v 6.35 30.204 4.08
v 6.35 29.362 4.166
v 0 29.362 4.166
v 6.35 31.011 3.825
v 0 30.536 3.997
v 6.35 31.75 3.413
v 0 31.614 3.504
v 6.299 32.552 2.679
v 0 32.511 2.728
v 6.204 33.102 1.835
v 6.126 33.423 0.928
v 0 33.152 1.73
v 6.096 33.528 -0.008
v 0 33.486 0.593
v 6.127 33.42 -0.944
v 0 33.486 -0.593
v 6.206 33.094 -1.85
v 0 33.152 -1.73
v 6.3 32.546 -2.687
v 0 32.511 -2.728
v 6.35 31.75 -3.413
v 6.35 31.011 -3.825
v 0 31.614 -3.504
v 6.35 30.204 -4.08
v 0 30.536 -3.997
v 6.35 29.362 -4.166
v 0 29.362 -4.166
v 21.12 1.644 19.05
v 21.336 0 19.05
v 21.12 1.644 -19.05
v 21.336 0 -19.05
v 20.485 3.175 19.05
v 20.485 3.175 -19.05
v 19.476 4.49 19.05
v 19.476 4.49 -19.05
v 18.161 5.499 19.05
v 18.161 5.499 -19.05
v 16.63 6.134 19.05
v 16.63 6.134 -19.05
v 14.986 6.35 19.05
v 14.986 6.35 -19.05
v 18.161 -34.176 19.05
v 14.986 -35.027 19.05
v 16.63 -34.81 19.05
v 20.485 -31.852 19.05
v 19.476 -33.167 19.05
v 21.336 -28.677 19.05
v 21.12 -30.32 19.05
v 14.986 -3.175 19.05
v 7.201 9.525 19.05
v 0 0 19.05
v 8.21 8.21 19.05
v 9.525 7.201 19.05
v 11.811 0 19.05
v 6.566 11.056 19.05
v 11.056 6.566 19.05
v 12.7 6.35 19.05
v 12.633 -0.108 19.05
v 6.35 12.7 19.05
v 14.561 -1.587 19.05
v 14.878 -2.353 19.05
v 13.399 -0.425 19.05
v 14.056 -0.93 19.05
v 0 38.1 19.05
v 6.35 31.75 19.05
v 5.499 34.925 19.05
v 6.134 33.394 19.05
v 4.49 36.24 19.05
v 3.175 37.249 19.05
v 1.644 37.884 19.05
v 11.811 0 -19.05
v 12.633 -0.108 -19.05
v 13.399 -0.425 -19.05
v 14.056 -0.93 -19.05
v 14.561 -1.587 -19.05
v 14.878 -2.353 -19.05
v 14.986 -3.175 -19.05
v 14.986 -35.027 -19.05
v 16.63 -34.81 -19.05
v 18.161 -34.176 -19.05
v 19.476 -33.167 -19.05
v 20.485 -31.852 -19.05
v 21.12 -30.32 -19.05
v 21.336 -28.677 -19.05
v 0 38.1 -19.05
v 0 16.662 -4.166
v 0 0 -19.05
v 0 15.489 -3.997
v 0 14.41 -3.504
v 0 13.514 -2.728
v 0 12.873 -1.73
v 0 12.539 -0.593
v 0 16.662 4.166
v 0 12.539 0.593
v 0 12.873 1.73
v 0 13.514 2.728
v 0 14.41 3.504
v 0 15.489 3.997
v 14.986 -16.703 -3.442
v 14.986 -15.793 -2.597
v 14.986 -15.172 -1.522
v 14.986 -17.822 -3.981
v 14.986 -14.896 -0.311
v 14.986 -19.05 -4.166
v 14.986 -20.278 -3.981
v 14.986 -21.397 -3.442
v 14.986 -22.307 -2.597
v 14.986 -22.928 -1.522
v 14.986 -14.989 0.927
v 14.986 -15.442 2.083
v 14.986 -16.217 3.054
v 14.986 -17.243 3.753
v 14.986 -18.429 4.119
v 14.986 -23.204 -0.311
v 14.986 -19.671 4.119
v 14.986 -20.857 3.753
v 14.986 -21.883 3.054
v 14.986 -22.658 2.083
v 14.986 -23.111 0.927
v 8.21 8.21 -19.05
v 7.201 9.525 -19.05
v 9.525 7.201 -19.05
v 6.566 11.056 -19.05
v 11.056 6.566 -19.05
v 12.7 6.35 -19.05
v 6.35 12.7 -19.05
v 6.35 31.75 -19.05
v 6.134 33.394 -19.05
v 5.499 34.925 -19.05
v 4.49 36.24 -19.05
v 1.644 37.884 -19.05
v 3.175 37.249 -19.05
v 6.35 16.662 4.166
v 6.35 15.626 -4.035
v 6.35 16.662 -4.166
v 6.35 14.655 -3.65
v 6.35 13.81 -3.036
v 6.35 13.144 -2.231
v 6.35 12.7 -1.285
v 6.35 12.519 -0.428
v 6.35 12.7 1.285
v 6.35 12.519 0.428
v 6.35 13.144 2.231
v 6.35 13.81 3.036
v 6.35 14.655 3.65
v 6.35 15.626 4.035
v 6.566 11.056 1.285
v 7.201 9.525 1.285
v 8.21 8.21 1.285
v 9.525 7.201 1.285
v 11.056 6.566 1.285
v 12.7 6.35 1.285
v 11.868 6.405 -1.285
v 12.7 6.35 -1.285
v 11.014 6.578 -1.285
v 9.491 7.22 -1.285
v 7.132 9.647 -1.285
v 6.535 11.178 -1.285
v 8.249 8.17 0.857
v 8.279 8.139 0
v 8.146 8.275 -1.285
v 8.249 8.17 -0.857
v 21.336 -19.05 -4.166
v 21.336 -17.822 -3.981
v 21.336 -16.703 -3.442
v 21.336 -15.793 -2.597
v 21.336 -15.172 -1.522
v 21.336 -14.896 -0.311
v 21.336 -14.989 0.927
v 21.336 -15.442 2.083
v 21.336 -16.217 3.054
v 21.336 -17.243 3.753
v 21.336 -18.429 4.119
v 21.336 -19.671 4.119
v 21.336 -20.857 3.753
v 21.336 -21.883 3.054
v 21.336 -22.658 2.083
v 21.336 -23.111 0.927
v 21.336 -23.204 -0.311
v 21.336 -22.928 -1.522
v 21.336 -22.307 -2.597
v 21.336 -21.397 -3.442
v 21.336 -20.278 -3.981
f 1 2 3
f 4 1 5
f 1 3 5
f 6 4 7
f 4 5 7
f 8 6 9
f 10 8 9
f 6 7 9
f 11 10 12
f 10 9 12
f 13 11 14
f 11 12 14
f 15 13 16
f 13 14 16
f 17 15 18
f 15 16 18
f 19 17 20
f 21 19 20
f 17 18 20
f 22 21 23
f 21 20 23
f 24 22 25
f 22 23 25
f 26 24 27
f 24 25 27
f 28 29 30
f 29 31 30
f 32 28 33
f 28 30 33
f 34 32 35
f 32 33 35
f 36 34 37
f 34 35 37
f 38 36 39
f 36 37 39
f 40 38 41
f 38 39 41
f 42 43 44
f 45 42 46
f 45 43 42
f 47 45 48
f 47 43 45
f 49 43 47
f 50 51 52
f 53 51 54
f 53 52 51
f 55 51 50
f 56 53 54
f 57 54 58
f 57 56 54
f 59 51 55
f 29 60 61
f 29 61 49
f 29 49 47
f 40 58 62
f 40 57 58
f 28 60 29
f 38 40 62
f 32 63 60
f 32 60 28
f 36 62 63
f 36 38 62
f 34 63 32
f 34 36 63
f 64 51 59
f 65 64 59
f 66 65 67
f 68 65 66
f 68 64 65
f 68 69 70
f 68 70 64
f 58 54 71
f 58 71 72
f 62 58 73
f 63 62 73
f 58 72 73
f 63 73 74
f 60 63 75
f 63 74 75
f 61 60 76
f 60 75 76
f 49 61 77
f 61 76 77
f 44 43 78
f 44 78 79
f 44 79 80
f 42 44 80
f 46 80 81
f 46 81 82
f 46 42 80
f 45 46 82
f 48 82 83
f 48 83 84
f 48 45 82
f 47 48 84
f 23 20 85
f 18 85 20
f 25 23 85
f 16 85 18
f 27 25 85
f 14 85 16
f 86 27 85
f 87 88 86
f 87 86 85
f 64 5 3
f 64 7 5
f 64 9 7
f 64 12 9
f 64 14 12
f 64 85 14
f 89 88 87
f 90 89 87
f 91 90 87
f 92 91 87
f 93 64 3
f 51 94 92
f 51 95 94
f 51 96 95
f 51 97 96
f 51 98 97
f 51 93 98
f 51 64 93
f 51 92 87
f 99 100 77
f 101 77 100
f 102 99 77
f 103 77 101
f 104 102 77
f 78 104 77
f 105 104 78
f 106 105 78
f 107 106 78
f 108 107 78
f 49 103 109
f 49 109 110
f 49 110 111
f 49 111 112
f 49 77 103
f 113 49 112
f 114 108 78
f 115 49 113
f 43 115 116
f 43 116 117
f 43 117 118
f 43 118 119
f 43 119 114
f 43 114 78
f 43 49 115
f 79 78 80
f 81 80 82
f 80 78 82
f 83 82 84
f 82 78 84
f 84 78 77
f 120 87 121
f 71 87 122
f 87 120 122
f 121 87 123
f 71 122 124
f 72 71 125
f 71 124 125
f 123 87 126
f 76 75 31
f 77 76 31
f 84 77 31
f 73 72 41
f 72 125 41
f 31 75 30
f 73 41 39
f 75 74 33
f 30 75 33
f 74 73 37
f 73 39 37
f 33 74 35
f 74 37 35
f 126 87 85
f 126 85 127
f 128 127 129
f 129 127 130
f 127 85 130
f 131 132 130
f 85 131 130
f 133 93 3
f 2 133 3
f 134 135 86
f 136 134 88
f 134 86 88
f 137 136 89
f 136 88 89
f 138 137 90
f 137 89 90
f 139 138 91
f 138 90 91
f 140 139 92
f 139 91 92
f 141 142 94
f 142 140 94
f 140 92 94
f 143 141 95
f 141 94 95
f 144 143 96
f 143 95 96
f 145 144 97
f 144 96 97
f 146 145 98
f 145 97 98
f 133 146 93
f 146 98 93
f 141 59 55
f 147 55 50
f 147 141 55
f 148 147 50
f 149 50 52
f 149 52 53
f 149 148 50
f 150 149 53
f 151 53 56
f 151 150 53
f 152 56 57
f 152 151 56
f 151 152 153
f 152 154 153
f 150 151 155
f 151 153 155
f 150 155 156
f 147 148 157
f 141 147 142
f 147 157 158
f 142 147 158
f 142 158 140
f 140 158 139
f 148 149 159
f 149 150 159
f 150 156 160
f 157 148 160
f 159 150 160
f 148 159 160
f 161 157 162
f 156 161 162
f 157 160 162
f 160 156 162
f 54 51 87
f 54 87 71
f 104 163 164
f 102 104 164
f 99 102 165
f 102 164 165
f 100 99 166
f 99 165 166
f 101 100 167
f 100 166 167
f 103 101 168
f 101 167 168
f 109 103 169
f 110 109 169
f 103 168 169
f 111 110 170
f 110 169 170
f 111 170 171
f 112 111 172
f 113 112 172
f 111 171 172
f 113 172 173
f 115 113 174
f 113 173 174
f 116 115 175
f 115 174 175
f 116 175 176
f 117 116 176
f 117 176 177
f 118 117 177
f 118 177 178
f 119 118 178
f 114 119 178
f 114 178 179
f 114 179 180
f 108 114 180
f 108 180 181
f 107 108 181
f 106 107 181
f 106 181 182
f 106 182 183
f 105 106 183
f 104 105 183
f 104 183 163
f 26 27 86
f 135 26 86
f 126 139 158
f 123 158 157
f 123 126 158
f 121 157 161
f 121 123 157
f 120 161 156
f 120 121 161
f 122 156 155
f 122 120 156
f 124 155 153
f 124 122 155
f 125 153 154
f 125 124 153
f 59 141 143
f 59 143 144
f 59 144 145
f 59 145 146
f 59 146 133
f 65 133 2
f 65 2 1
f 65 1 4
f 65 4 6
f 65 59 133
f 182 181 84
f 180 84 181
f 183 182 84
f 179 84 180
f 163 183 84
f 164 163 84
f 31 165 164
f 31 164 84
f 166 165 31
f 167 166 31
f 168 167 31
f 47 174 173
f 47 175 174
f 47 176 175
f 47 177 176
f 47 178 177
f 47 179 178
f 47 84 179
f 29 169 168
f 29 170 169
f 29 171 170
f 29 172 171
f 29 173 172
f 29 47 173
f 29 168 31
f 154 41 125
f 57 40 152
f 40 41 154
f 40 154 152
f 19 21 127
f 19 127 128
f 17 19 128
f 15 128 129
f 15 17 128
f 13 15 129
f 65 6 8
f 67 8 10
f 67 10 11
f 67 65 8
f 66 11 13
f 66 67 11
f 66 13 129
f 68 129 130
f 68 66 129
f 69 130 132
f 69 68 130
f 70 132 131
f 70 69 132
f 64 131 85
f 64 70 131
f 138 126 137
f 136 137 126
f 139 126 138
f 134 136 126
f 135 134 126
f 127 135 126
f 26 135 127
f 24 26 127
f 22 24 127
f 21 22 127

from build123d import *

# Parameters (mm, degrees)
BOSS_EXTRUDE1_DEPTH      = 38.1
CUT_EXTRUDE1_DEPTH       = 48.641761051
F_5_16_CLEARANCE_HOLE1_D = 8.3312
FILLET1_R                = 3.175
FILLET2_R                = 6.35


with BuildPart() as part:
    # Sketch1 → Boss-Extrude1 (new body)
    with BuildSketch(Plane.XY.offset(19.05)):
        with BuildLine():
            Line((0, 38.1), (0, 0))
            Line((0, 0), (14.986, 0))
            Line((14.986, 0), (14.986, -35.0266))
            ThreePointArc((14.986, -35.0266), (19.476128061, -33.166728061), (21.336, -28.6766))
            Line((21.336, -28.6766), (21.336, 6.35))
            Line((21.336, 6.35), (6.35, 6.35))
            Line((6.35, 6.35), (6.35, 31.75))
            ThreePointArc((6.35, 31.75), (4.490128061, 36.240128061), (0, 38.1))
        make_face()
    extrude(amount=-BOSS_EXTRUDE1_DEPTH)

    # Sketch2 → Cut-Extrude1 (cut, through all)
    with BuildSketch(Plane.ZY):
        with BuildLine():
            Line((-4.1656, 29.3624), (-4.1656, 16.6624))
            ThreePointArc((-4.1656, 16.6624), (0, 12.4968), (4.1656, 16.6624))
            Line((4.1656, 16.6624), (4.1656, 29.3624))
            ThreePointArc((4.1656, 29.3624), (0, 33.528), (-4.1656, 29.3624))
        make_face()
    extrude(amount=-CUT_EXTRUDE1_DEPTH, mode=Mode.SUBTRACT)

    # 5/16 Clearance Hole1 (through all)
    with Locations(Plane.ZY.offset(-14.986)):
        with Locations((0, -19.05)):
            Hole(F_5_16_CLEARANCE_HOLE1_D / 2)

    # Fillet1
    fillet1_edges = [part.edges().sort_by_distance(p)[0] for p in [
        (14.986, 0, 0),
    ]]
    fillet(fillet1_edges, radius=FILLET1_R)

    # Fillet2
    fillet2_edges = [part.edges().sort_by_distance(p)[0] for p in [
        (6.35, 6.35, 0),
        (21.336, 6.35, 0),
    ]]
    fillet(fillet2_edges, radius=FILLET2_R)


solid = part.part
